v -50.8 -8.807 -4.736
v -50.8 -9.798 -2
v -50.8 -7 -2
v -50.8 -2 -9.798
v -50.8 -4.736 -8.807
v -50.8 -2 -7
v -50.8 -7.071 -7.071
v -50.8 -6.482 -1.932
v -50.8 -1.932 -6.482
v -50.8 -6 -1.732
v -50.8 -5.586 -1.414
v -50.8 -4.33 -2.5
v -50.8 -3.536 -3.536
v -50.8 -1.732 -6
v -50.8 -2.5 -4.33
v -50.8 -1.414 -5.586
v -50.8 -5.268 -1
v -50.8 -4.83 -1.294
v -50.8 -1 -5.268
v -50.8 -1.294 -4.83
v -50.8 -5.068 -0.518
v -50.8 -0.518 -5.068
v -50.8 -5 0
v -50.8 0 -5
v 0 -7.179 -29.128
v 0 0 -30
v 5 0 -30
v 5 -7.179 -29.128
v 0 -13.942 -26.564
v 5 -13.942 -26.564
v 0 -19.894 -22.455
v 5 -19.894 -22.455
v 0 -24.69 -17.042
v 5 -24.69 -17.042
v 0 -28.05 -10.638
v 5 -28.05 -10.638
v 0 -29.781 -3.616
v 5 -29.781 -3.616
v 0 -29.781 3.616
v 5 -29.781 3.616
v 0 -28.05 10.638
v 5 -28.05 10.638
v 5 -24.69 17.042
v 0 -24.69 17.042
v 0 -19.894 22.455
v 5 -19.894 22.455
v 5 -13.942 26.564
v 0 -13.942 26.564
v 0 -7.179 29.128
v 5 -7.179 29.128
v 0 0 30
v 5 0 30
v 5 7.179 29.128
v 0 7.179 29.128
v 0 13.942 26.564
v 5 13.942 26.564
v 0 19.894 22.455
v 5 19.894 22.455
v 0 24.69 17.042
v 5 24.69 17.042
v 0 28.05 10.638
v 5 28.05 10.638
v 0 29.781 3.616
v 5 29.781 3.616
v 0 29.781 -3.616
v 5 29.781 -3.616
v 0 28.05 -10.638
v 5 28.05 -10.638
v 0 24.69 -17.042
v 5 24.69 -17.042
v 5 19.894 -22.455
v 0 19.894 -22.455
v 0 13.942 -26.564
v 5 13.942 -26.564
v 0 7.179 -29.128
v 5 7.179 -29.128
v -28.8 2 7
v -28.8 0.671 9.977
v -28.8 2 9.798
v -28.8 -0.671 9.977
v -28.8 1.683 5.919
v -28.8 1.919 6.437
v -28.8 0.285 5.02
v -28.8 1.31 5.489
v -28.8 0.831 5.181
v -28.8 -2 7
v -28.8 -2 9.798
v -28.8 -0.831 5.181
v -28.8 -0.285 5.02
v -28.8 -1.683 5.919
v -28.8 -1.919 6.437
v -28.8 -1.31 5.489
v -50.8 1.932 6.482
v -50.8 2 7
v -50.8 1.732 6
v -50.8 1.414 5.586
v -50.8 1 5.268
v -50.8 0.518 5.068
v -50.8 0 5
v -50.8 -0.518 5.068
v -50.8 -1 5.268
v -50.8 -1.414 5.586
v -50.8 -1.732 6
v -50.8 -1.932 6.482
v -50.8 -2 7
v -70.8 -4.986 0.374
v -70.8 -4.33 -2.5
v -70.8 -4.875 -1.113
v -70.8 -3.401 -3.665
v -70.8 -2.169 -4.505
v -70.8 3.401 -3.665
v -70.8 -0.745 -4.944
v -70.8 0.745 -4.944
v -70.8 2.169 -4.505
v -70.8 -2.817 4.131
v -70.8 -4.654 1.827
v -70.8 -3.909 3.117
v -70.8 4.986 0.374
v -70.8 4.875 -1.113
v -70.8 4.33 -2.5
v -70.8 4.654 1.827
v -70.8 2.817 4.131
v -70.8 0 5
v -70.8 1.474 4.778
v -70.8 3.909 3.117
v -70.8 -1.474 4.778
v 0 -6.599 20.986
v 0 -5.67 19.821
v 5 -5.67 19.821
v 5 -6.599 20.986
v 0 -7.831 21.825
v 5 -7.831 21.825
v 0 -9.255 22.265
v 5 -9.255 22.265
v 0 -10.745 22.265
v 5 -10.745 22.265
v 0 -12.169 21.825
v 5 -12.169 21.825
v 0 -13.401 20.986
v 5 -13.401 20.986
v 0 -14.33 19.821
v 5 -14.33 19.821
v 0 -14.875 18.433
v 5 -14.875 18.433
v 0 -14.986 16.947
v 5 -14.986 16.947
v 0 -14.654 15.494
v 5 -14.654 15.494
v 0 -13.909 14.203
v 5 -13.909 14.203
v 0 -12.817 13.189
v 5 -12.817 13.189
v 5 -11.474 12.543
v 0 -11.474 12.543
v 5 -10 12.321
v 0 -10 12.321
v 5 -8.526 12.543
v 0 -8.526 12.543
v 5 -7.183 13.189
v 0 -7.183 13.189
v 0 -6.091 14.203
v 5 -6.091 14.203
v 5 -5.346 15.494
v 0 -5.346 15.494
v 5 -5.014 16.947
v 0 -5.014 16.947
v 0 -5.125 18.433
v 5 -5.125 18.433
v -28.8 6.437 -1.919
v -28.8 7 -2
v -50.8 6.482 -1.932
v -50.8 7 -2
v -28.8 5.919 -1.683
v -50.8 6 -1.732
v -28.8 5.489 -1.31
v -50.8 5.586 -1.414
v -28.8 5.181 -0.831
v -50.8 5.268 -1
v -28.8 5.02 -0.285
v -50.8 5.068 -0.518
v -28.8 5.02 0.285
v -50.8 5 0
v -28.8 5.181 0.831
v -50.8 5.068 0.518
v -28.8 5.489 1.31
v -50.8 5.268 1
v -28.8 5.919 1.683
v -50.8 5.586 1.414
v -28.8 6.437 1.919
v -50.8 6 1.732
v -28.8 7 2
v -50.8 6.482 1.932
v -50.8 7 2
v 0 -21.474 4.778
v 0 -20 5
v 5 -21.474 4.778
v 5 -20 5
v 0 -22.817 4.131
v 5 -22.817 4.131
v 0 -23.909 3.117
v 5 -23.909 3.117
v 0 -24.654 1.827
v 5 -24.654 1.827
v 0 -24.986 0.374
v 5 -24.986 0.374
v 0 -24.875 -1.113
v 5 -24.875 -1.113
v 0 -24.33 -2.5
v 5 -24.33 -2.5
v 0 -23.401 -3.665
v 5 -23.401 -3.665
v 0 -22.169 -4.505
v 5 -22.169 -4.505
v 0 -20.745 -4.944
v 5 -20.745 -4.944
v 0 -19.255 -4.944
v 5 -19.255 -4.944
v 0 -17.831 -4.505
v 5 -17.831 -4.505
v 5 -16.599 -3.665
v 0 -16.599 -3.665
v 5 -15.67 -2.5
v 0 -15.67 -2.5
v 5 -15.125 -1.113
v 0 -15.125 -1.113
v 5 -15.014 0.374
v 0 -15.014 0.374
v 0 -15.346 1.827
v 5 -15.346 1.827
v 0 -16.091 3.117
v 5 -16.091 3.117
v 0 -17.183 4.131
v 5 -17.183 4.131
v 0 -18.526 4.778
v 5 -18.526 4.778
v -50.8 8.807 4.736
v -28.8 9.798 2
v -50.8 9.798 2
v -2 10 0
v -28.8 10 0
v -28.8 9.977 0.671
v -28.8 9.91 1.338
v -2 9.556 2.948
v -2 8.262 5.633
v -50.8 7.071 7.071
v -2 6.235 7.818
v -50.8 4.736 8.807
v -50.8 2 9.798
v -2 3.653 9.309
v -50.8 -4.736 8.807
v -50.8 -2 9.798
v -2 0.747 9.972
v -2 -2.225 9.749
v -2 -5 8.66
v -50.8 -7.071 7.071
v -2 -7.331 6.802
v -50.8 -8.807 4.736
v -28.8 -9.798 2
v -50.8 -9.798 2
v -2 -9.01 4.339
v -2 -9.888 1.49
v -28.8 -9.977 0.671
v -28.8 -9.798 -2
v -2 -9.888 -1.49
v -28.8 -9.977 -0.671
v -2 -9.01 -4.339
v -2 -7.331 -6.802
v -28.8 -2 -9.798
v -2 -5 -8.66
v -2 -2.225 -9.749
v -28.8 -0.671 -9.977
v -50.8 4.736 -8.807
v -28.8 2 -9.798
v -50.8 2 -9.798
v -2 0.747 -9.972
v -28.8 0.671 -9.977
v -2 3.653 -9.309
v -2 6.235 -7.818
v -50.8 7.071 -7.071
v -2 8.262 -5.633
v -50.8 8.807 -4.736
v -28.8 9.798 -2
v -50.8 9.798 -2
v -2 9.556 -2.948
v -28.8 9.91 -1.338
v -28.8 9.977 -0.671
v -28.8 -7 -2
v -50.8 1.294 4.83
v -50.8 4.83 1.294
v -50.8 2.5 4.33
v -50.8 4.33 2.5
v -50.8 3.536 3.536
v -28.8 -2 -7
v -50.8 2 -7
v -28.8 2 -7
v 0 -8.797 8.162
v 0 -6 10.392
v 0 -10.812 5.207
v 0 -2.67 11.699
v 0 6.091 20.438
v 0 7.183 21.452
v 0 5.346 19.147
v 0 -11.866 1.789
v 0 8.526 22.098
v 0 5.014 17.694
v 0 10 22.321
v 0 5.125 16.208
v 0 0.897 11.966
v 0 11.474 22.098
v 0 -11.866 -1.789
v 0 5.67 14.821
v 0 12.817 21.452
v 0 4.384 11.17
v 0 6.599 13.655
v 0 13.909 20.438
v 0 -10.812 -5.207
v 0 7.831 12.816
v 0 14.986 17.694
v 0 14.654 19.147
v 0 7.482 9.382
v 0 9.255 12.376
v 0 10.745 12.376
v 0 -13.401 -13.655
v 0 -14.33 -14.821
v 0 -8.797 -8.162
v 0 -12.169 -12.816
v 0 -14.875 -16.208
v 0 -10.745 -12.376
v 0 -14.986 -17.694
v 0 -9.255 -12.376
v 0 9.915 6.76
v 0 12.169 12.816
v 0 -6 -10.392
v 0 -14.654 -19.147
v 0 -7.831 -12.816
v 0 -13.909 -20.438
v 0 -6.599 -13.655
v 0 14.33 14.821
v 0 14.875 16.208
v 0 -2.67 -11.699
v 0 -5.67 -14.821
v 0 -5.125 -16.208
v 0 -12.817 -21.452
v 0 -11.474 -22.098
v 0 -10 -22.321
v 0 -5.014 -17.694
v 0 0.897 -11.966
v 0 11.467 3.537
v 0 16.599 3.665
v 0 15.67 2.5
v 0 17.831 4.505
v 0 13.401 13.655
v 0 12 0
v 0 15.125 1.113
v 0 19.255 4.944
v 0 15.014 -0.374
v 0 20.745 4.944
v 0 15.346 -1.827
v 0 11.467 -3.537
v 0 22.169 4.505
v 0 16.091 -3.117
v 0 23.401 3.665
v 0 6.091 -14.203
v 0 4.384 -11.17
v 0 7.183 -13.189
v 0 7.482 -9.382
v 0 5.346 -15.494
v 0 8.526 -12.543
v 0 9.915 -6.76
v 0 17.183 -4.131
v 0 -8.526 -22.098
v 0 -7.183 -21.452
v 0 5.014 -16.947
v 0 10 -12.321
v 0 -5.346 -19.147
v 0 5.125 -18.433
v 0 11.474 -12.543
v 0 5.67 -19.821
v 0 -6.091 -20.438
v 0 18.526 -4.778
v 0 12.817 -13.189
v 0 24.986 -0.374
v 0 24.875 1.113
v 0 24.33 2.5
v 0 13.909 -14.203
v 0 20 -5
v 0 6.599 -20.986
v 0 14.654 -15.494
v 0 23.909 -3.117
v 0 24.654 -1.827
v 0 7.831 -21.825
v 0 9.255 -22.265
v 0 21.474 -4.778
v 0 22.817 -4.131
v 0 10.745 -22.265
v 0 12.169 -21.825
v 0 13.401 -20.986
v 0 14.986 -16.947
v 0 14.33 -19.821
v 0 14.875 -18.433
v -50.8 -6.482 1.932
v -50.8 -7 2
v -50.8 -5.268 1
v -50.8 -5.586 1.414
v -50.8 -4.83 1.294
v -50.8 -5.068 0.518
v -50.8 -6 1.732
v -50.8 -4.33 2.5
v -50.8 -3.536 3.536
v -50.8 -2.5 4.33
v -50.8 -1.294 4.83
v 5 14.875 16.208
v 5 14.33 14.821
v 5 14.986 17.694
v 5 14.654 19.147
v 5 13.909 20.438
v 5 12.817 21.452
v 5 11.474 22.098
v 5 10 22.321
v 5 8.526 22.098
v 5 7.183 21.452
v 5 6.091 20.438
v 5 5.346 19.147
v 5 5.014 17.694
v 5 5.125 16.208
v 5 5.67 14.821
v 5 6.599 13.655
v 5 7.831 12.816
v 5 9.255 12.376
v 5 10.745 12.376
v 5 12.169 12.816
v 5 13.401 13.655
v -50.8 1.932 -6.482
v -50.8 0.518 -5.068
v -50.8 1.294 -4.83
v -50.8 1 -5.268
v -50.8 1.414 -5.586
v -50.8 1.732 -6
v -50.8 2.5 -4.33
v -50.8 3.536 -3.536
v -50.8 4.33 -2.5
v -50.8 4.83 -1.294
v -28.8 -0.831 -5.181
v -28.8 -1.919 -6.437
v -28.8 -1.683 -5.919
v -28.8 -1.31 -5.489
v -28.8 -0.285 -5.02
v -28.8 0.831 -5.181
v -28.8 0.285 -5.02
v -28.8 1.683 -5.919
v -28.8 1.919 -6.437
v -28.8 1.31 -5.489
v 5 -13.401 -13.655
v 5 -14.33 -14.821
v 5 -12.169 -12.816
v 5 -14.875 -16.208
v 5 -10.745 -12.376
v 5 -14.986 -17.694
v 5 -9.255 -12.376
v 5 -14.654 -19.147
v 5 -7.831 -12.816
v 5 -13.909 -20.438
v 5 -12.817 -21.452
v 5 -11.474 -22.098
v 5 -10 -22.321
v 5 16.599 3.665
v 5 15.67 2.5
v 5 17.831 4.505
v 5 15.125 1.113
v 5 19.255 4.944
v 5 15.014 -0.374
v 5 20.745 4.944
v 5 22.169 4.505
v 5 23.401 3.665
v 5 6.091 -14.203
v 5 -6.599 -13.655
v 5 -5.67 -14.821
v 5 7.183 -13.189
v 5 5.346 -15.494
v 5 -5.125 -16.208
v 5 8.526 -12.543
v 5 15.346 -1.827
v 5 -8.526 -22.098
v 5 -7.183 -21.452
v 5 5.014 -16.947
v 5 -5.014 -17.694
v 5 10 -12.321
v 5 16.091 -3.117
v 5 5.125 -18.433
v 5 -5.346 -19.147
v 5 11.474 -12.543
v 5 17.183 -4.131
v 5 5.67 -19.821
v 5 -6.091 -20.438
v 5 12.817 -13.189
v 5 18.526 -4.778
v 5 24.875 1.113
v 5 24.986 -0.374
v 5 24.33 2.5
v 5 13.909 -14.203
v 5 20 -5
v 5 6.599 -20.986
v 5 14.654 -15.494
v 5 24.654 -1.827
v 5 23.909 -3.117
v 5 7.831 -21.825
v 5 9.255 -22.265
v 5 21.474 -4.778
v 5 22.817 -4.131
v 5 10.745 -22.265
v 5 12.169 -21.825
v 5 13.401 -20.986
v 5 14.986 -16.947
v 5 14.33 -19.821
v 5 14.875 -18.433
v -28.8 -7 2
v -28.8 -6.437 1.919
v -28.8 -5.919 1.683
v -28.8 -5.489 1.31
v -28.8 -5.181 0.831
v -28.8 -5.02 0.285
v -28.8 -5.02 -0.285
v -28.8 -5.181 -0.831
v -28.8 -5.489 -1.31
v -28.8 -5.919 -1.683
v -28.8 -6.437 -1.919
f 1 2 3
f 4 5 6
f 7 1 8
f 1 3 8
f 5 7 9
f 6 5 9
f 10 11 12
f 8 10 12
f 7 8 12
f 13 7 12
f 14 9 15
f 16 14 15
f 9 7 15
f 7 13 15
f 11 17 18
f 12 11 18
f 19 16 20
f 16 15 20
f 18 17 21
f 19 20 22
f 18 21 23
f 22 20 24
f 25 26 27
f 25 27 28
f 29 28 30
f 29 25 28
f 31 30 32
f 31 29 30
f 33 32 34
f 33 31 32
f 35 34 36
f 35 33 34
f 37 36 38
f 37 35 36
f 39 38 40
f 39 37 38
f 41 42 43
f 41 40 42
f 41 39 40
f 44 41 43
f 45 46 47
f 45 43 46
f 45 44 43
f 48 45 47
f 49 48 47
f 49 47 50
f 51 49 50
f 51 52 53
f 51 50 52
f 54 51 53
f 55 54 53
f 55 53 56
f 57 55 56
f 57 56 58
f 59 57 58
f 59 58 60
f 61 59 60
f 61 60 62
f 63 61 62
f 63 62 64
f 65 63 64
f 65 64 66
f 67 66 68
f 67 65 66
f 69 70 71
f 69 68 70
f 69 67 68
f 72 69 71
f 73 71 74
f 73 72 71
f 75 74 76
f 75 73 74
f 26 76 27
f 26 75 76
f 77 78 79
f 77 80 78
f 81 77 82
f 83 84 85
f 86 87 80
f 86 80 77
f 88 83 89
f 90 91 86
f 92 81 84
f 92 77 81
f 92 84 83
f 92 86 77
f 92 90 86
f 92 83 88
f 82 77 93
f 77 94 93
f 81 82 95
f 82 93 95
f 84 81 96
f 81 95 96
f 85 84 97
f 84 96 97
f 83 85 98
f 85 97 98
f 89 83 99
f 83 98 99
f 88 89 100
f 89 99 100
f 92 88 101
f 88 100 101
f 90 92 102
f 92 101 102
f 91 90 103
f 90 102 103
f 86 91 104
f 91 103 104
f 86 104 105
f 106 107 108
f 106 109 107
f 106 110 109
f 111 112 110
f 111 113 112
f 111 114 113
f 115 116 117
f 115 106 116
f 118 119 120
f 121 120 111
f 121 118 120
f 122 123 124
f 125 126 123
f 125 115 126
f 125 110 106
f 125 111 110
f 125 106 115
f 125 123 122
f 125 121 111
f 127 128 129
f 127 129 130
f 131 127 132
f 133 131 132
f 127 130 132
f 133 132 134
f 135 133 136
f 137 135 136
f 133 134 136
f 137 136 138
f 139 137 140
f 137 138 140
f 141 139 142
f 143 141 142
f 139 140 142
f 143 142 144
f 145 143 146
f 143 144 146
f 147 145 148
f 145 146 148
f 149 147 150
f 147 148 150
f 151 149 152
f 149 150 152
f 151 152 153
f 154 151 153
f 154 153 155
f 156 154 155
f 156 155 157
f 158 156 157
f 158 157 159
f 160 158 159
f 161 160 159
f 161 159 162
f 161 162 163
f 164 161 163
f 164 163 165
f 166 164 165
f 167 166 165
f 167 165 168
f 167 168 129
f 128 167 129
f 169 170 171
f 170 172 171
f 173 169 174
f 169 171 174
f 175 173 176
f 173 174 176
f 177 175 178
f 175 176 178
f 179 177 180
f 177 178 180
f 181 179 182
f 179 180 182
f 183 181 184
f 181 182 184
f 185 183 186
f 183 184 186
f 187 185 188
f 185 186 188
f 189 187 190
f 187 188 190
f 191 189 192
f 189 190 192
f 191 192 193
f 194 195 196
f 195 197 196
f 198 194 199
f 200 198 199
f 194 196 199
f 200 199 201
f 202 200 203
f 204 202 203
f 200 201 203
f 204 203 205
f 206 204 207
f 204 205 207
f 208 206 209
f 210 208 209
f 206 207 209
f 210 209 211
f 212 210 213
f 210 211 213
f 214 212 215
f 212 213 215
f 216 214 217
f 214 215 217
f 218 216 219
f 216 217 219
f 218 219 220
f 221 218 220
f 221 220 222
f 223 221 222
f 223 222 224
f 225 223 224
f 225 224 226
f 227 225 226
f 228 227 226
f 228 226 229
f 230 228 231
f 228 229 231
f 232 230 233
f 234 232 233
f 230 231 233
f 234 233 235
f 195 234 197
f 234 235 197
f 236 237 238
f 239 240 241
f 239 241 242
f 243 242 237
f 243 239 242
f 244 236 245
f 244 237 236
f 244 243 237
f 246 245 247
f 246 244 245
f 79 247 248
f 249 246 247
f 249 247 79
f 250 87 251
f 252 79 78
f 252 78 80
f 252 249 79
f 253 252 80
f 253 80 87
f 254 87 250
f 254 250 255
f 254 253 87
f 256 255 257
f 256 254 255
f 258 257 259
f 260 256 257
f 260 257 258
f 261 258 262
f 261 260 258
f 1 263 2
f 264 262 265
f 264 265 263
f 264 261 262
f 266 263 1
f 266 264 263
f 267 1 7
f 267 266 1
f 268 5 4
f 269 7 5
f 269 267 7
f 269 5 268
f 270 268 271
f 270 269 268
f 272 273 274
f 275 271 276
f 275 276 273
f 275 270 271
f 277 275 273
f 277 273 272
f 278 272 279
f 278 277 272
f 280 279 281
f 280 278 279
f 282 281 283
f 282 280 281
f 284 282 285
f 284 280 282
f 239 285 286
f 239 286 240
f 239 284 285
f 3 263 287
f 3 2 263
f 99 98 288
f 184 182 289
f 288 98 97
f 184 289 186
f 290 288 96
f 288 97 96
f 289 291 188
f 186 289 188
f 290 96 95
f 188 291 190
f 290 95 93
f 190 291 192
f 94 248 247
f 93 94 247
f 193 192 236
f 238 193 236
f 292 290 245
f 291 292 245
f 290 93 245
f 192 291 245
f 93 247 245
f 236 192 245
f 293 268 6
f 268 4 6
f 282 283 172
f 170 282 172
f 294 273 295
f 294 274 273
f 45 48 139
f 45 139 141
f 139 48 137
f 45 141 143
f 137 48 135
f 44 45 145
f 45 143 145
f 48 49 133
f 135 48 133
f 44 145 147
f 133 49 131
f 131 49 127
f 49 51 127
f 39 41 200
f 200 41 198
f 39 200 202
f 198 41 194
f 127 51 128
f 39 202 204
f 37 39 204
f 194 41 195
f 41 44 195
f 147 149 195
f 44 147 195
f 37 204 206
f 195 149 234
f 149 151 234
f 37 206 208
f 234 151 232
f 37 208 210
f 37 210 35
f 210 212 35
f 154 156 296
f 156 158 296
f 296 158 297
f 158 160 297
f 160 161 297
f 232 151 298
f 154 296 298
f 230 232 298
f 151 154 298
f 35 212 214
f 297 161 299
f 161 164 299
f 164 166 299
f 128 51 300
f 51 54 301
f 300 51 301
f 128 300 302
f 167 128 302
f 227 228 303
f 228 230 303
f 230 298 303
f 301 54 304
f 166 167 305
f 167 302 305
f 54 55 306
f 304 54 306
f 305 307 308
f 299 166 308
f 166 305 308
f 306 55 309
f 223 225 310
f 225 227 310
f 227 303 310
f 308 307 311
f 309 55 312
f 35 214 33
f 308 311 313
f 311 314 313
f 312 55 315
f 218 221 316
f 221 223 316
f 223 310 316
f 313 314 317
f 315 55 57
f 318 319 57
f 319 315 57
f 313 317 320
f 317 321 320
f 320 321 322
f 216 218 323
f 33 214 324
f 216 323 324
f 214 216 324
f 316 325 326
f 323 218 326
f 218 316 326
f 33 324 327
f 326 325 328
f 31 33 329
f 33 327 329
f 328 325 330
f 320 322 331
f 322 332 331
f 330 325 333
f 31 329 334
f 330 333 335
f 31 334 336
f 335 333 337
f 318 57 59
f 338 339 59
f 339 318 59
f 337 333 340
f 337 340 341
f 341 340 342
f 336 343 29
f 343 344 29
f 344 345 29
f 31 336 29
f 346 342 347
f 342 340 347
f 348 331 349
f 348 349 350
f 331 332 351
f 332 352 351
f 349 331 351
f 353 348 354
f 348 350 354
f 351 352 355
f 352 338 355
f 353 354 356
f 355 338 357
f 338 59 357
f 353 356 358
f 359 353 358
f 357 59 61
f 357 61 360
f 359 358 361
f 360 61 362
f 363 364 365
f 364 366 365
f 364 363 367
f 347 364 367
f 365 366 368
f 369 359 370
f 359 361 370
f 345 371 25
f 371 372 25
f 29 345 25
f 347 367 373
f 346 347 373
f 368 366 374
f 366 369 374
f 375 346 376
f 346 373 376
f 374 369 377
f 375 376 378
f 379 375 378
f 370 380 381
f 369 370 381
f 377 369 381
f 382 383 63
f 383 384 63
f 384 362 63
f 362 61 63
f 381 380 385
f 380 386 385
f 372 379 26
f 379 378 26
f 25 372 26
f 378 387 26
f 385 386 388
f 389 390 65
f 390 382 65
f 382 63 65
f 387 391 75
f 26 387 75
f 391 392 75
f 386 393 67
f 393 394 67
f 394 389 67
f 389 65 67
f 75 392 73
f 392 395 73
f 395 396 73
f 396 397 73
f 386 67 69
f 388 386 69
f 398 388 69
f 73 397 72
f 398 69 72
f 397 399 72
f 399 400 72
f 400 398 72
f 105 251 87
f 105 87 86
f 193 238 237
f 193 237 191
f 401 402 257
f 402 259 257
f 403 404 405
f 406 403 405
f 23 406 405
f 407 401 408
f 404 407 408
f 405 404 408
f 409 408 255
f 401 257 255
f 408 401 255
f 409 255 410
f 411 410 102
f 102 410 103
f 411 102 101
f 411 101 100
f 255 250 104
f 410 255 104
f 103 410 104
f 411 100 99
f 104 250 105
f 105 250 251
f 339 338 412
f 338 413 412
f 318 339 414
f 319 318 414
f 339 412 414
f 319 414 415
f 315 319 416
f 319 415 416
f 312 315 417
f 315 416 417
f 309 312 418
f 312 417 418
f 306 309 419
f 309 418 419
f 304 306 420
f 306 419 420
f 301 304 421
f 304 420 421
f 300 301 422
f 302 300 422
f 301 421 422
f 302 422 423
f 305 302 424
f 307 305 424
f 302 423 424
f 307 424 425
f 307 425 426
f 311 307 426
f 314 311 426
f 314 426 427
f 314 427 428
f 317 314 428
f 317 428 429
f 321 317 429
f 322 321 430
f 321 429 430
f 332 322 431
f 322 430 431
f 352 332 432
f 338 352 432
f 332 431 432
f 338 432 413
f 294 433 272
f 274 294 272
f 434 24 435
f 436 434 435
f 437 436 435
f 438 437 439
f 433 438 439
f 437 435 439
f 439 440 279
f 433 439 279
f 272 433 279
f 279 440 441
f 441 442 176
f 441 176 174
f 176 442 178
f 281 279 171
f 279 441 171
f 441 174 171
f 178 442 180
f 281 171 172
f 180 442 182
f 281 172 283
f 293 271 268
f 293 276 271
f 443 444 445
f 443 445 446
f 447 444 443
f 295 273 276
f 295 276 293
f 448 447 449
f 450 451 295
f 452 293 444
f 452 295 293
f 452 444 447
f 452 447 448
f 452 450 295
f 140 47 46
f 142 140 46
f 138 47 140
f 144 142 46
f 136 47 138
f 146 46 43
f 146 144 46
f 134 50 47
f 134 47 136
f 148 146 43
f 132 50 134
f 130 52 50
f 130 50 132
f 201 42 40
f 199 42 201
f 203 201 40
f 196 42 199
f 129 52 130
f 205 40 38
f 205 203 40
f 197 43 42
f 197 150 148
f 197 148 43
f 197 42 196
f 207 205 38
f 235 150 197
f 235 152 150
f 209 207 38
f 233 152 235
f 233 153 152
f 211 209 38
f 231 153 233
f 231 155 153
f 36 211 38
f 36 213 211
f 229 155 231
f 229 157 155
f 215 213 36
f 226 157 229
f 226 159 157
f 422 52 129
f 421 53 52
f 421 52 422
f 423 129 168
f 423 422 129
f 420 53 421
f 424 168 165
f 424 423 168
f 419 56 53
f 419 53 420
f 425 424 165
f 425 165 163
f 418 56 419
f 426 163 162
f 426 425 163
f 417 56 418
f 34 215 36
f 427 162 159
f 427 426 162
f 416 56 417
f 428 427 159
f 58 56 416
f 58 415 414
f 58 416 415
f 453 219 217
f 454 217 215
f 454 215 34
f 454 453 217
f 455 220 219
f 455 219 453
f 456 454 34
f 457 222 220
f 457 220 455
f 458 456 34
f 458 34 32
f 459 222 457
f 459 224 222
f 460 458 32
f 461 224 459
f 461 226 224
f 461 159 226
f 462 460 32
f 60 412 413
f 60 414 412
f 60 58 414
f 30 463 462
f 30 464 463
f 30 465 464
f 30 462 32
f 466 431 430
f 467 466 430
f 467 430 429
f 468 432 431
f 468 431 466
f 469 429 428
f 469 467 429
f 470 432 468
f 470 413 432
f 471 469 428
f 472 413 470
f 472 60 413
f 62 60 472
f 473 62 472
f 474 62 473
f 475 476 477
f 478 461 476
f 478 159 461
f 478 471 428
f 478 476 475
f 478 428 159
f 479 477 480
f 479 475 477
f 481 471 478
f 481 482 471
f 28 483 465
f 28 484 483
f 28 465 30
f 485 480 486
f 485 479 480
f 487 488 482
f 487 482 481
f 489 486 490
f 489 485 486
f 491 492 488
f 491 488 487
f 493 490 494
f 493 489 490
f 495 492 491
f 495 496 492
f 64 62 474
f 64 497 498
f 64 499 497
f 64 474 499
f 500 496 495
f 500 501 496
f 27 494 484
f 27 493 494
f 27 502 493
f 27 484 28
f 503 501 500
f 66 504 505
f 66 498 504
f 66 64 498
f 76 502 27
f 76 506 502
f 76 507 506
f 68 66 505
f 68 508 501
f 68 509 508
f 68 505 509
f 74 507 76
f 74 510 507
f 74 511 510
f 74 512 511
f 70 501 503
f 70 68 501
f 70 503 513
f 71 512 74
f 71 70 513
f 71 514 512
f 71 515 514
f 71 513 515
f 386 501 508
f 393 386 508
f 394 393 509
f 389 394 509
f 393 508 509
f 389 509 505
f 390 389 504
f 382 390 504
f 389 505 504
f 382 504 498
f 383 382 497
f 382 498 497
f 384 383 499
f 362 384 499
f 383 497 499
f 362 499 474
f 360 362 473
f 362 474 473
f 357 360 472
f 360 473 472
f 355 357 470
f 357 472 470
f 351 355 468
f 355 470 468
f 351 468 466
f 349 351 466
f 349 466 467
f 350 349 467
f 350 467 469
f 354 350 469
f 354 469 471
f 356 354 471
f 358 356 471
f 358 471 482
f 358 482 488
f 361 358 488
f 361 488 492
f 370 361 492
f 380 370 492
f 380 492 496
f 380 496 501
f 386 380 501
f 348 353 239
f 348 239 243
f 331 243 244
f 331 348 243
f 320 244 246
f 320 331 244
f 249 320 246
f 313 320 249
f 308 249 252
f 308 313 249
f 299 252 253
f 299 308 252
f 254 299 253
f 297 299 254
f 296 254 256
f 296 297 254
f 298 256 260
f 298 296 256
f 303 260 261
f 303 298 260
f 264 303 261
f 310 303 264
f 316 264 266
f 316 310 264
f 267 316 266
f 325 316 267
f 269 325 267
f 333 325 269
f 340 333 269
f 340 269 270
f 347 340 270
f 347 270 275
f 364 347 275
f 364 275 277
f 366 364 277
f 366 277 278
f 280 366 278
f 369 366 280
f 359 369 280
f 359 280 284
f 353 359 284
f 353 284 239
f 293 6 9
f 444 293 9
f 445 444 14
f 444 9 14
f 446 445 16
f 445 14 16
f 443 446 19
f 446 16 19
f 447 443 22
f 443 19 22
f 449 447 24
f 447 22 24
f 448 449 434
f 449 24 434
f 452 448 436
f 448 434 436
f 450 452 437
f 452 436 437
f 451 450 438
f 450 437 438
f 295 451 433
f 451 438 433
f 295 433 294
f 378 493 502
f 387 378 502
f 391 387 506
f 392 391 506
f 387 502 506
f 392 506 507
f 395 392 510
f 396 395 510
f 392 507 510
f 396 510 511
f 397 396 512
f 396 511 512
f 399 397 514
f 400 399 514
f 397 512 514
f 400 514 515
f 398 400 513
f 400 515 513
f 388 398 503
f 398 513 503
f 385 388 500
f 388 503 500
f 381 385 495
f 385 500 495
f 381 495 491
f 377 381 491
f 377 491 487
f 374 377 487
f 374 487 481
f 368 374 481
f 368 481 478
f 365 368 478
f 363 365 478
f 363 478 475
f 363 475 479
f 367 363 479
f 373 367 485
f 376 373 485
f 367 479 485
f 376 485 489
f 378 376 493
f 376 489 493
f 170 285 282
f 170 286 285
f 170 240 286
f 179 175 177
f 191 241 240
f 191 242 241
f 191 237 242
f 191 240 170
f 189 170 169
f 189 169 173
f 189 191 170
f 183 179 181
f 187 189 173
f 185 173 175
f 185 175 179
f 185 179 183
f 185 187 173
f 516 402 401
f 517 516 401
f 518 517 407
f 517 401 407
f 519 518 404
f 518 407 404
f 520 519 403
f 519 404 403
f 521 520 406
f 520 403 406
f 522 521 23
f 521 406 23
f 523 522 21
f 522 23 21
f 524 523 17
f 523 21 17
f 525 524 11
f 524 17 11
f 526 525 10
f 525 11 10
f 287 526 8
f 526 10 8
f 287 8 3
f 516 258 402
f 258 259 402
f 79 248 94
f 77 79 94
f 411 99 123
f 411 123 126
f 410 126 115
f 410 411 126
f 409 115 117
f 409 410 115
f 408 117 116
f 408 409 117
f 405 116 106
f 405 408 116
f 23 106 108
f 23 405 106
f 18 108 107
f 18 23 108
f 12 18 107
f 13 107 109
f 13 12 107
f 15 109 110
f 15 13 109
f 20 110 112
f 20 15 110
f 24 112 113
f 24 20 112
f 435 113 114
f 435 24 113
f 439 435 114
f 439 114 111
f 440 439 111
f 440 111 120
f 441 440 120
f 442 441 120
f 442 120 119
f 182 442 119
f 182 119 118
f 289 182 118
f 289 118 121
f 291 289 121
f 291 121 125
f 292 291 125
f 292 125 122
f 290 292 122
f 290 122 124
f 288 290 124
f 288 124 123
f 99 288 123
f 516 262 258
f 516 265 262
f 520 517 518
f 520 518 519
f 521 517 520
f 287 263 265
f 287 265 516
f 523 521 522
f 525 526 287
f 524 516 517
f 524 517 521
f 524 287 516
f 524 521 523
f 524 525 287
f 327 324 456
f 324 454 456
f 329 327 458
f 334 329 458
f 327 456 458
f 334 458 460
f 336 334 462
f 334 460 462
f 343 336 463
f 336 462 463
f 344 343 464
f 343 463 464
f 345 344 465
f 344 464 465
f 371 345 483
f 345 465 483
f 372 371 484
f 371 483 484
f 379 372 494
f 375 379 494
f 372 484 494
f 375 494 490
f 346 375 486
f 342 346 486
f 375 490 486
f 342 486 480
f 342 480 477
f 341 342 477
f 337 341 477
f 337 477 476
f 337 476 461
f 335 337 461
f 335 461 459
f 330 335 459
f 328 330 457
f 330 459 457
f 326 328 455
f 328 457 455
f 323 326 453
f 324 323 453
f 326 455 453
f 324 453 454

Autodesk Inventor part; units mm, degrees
ref_plane "YZ Plane" through (0, 0, 0) normal (1, 0, 0) x (0, 1, 0)
ref_plane "XZ Plane" through (0, 0, 0) normal (0, 1, 0) x (-1, 0, 0)
sketch "Sketch1" plane through (0, 0, 0) normal (1, 0, 0) x (0, 1, 0)
  circle A0 centre (0, 0) radius 6.19 construction
  circle A1 centre (0, 0) radius 10
  dimension "d0" = 20
  dimension "d1" = 3.81
extrude "Main Shaft" add sketch "Sketch1" against normal blind 50.8
sketch "Sketch2" plane through (0, 0, 0) normal (1, 0, 0) x (0, 0, -1)
  circle A0 centre (0, 0) radius 30
  dimension "d4" = 60
extrude "CV Flange" add sketch "Sketch2" along normal blind 5
sketch "Sketch3" plane through (5, 0, 0) normal (1, 0, 0) x (0, 0, -1)
  circle A0 centre (0, 20) radius 5
  circle A1 centre (0, 0) radius 20 construction
  line L0 (0, 0) -> (0, 20) construction
  dimension "d7" = 40
  dimension "d8" = 10
extrude "CV Bolt Hole" cut sketch "Sketch3" against normal up to surface (5 mm away)
pattern_circular "CV Bolt Pattern" count 6 over 360 about axis through (-10, 0, 0) along (1, 0, 0) of "CV Bolt Hole"
chamfer "Weld_Chamfer" distance 2 angle 45 1 edges at (0, -10, 0)
ref_plane "Lock Pin Hole Plane" through (0, 0, 12.7) normal (0, 0, 1) x (1, 0, 0)
sketch "Sketch5" plane through (-50.8, 0, 0) normal (-1, 0, 0) x (0, 0, 1)
  line L0 (-20, 0) -> (15, 0) construction
  line L1 (0, 14) -> (0, -14) construction
  arc A0 (-13, 2) -> (-13, -2) centre (-13, 0) ccw
  arc A1 (-7, -2) -> (-7, 2) centre (-7, 0) ccw
  line L2 (-13, -2) -> (-7, -2)
  line L3 (-13, 2) -> (-7, 2)
  point P0 (0, 0)
  dimension "d23" = 2
  dimension "d24" = 7
  dimension "d25" = 6
extrude "Key Slot" cut sketch "Sketch5" against normal blind 22
pattern_circular "Circular Pattern2" count 4 over 360 about axis through (-10, 0, 0) along (1, 0, 0) of "Key Slot"
sketch "Sketch6" plane through (-50.8, 0, 0) normal (-1, 0, 0) x (0, 0, 1)
  circle A0 centre (0, 0) radius 5
  arc A1 (-7, -2) -> (-7, 2) centre (-7, 0) ccw projected
extrude "Extrusion6" add sketch "Sketch6" along normal blind 20
thread "M10x1.5 thread" size "M10x1.5" class "6g" standard "ANSI Metric M Profile" length 20 offset 5
equation "\"d1\" = Shaft_Wall_Thickness"
equation "\"d2\" = Shaft_Length"
equation "\"d4\" = Driveshaft_Flange_Diameter"
equation "\"d5\" = Driveshaft_Flange_Thickness"
equation "\"d7\" = CV_Bolt_Pattern_Diameter"
equation "\"d8\" = CV_Bolt_Hole_Diameter"
equation "\"Shaft_Diameter\" = 25.4"
equation "\"Shaft_Wall_Thickness\" = 3.81"
equation "\"Driveshaft_Flange_Diameter\" = 60"
equation "\"Driveshaft_Flange_Thickness\" = 5"
equation "\"CV_Bolt_Hole_Diameter\" = 10"
equation "\"d18\" = 0.5 * Shaft_Diameter"
equation "\"Shaft_Length\" = 50.8"
equation "\"CV_Bolt_Pattern_Diameter\" = 40"
properties part number "Hub-CV Adapter"
